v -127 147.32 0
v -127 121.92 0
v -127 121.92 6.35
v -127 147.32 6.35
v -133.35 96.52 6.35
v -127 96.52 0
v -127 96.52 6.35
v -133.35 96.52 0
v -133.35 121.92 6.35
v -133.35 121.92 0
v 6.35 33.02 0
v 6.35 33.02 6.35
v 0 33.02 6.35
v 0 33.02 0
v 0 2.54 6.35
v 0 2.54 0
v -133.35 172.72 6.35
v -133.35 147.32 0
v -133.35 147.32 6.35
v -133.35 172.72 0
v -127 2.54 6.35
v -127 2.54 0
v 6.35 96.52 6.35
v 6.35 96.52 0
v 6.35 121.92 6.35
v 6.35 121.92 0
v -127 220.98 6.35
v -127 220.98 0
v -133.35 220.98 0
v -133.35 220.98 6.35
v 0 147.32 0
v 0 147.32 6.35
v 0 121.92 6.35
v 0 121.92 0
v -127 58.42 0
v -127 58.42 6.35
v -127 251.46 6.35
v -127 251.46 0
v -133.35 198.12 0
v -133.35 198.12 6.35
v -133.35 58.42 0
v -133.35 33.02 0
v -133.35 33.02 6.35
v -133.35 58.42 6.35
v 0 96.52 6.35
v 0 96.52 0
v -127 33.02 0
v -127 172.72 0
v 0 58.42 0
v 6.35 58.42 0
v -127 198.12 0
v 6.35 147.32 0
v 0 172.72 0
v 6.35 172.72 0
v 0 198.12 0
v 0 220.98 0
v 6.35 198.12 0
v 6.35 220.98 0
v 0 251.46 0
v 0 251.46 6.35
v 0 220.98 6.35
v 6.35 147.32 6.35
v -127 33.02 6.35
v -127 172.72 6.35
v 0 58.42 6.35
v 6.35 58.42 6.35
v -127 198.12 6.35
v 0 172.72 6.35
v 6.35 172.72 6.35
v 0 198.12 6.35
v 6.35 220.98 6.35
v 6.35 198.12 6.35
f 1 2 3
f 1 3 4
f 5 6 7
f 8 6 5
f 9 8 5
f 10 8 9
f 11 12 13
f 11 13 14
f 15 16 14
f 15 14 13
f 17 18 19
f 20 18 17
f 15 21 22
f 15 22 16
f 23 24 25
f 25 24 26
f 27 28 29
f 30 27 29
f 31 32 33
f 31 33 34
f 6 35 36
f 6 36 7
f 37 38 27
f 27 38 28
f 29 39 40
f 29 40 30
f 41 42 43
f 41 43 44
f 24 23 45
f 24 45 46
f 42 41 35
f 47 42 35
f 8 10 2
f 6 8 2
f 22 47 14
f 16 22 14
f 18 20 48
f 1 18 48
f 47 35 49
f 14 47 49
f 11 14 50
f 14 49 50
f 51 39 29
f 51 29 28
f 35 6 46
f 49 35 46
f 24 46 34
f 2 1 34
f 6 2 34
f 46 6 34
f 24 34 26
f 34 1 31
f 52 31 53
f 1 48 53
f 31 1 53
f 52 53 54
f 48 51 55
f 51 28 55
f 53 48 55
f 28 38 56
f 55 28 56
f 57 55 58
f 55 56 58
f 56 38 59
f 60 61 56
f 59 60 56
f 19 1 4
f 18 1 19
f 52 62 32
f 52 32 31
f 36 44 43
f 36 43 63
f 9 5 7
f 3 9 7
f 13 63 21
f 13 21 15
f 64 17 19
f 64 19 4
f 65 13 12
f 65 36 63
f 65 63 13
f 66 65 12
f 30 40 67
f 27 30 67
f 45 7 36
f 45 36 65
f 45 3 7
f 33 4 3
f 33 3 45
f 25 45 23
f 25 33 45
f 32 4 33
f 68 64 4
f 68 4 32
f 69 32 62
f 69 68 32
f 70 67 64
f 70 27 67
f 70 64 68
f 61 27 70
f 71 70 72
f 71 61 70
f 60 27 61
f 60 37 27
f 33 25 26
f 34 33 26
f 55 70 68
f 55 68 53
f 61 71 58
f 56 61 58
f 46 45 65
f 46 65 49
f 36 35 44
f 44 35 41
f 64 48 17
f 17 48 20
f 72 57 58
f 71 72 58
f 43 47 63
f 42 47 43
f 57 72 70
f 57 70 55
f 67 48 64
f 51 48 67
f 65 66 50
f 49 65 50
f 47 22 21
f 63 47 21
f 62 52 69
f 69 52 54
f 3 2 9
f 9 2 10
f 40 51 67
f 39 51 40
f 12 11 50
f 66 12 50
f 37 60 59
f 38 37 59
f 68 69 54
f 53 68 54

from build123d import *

# Parameters (mm, degrees)
SKETCH1_W           = 139.7
SKETCH1_H           = 246.38
BOSS_EXTRUDE1_DEPTH = 6.35
SKETCH2_W           = 6.35
SKETCH2_H           = 26.67
SKETCH2_H_2         = 38.1
SKETCH2_H_3         = 25.4
SKETCH2_H_4         = 31.75
CUT_EXTRUDE1_DEPTH  = 6.35
SKETCH7_W           = 6.35
SKETCH7_H           = 26.67
SKETCH7_H_2         = 38.1
SKETCH7_H_3         = 25.4
CUT_EXTRUDE5_DEPTH  = 7.35
SKETCH8_W           = 127
SKETCH8_H           = 6.35
BOSS_EXTRUDE2_DEPTH = 3.81
SKETCH6_W           = 6.35
SKETCH6_H           = 1.27
CUT_EXTRUDE6_DEPTH  = 134.35


with BuildPart() as part:
    # Sketch1 → Boss-Extrude1 (new body)
    with BuildSketch(Plane.XY):
        with Locations((-63.5, 129.54)):
            Rectangle(SKETCH1_W, SKETCH1_H)
    extrude(amount=BOSS_EXTRUDE1_DEPTH)

    # Sketch2 → Cut-Extrude1 (cut)
    with BuildSketch(Plane(origin=(6.35, 0, 0), x_dir=(0, 0, -1), z_dir=(1, 0, 0))):
        with Locations((-3.175, 19.685)):
            Rectangle(SKETCH2_W, SKETCH2_H)
        with Locations((-3.175, 77.47)):
            Rectangle(SKETCH2_W, SKETCH2_H_2)
        with Locations((-3.175, 134.62)):
            Rectangle(SKETCH2_W, SKETCH2_H_3)
        with Locations((-3.175, 185.42)):
            Rectangle(SKETCH2_W, SKETCH2_H_3)
        with Locations((-3.175, 236.855)):
            Rectangle(SKETCH2_W, SKETCH2_H_4)
    extrude(amount=-CUT_EXTRUDE1_DEPTH, mode=Mode.SUBTRACT)

    # Sketch7 → Cut-Extrude5 (cut, through all)
    with BuildSketch(Plane(origin=(0, 0, 0), x_dir=(-1, 0, 0), z_dir=(0, 0, -1))):
        with Locations((130.175, 19.685)):
            Rectangle(SKETCH7_W, SKETCH7_H)
        with Locations((130.175, 77.47)):
            Rectangle(SKETCH7_W, SKETCH7_H_2)
        with Locations((130.175, 134.62)):
            Rectangle(SKETCH7_W, SKETCH7_H_3)
        with Locations((130.175, 185.42)):
            Rectangle(SKETCH7_W, SKETCH7_H_3)
        Polygon((127, 220.98), (133.35, 220.98), (133.35, 252.73), (127, 252.73), (127, 247.65), align=None)
    extrude(amount=-CUT_EXTRUDE5_DEPTH, mode=Mode.SUBTRACT)

    # Sketch8 → Boss-Extrude2 (add)
    with BuildSketch(Plane.XZ.offset(-6.35)):
        with Locations((-63.5, 3.175)):
            Rectangle(SKETCH8_W, SKETCH8_H)
    extrude(amount=BOSS_EXTRUDE2_DEPTH)

    # Sketch6 → Cut-Extrude6 (cut, through all)
    with BuildSketch(Plane(origin=(0, 0, 0), x_dir=(0, 0, -1), z_dir=(1, 0, 0))):
        with Locations((-3.175, 252.095)):
            Rectangle(SKETCH6_W, SKETCH6_H)
    extrude(amount=-CUT_EXTRUDE6_DEPTH, mode=Mode.SUBTRACT)


solid = part.part
